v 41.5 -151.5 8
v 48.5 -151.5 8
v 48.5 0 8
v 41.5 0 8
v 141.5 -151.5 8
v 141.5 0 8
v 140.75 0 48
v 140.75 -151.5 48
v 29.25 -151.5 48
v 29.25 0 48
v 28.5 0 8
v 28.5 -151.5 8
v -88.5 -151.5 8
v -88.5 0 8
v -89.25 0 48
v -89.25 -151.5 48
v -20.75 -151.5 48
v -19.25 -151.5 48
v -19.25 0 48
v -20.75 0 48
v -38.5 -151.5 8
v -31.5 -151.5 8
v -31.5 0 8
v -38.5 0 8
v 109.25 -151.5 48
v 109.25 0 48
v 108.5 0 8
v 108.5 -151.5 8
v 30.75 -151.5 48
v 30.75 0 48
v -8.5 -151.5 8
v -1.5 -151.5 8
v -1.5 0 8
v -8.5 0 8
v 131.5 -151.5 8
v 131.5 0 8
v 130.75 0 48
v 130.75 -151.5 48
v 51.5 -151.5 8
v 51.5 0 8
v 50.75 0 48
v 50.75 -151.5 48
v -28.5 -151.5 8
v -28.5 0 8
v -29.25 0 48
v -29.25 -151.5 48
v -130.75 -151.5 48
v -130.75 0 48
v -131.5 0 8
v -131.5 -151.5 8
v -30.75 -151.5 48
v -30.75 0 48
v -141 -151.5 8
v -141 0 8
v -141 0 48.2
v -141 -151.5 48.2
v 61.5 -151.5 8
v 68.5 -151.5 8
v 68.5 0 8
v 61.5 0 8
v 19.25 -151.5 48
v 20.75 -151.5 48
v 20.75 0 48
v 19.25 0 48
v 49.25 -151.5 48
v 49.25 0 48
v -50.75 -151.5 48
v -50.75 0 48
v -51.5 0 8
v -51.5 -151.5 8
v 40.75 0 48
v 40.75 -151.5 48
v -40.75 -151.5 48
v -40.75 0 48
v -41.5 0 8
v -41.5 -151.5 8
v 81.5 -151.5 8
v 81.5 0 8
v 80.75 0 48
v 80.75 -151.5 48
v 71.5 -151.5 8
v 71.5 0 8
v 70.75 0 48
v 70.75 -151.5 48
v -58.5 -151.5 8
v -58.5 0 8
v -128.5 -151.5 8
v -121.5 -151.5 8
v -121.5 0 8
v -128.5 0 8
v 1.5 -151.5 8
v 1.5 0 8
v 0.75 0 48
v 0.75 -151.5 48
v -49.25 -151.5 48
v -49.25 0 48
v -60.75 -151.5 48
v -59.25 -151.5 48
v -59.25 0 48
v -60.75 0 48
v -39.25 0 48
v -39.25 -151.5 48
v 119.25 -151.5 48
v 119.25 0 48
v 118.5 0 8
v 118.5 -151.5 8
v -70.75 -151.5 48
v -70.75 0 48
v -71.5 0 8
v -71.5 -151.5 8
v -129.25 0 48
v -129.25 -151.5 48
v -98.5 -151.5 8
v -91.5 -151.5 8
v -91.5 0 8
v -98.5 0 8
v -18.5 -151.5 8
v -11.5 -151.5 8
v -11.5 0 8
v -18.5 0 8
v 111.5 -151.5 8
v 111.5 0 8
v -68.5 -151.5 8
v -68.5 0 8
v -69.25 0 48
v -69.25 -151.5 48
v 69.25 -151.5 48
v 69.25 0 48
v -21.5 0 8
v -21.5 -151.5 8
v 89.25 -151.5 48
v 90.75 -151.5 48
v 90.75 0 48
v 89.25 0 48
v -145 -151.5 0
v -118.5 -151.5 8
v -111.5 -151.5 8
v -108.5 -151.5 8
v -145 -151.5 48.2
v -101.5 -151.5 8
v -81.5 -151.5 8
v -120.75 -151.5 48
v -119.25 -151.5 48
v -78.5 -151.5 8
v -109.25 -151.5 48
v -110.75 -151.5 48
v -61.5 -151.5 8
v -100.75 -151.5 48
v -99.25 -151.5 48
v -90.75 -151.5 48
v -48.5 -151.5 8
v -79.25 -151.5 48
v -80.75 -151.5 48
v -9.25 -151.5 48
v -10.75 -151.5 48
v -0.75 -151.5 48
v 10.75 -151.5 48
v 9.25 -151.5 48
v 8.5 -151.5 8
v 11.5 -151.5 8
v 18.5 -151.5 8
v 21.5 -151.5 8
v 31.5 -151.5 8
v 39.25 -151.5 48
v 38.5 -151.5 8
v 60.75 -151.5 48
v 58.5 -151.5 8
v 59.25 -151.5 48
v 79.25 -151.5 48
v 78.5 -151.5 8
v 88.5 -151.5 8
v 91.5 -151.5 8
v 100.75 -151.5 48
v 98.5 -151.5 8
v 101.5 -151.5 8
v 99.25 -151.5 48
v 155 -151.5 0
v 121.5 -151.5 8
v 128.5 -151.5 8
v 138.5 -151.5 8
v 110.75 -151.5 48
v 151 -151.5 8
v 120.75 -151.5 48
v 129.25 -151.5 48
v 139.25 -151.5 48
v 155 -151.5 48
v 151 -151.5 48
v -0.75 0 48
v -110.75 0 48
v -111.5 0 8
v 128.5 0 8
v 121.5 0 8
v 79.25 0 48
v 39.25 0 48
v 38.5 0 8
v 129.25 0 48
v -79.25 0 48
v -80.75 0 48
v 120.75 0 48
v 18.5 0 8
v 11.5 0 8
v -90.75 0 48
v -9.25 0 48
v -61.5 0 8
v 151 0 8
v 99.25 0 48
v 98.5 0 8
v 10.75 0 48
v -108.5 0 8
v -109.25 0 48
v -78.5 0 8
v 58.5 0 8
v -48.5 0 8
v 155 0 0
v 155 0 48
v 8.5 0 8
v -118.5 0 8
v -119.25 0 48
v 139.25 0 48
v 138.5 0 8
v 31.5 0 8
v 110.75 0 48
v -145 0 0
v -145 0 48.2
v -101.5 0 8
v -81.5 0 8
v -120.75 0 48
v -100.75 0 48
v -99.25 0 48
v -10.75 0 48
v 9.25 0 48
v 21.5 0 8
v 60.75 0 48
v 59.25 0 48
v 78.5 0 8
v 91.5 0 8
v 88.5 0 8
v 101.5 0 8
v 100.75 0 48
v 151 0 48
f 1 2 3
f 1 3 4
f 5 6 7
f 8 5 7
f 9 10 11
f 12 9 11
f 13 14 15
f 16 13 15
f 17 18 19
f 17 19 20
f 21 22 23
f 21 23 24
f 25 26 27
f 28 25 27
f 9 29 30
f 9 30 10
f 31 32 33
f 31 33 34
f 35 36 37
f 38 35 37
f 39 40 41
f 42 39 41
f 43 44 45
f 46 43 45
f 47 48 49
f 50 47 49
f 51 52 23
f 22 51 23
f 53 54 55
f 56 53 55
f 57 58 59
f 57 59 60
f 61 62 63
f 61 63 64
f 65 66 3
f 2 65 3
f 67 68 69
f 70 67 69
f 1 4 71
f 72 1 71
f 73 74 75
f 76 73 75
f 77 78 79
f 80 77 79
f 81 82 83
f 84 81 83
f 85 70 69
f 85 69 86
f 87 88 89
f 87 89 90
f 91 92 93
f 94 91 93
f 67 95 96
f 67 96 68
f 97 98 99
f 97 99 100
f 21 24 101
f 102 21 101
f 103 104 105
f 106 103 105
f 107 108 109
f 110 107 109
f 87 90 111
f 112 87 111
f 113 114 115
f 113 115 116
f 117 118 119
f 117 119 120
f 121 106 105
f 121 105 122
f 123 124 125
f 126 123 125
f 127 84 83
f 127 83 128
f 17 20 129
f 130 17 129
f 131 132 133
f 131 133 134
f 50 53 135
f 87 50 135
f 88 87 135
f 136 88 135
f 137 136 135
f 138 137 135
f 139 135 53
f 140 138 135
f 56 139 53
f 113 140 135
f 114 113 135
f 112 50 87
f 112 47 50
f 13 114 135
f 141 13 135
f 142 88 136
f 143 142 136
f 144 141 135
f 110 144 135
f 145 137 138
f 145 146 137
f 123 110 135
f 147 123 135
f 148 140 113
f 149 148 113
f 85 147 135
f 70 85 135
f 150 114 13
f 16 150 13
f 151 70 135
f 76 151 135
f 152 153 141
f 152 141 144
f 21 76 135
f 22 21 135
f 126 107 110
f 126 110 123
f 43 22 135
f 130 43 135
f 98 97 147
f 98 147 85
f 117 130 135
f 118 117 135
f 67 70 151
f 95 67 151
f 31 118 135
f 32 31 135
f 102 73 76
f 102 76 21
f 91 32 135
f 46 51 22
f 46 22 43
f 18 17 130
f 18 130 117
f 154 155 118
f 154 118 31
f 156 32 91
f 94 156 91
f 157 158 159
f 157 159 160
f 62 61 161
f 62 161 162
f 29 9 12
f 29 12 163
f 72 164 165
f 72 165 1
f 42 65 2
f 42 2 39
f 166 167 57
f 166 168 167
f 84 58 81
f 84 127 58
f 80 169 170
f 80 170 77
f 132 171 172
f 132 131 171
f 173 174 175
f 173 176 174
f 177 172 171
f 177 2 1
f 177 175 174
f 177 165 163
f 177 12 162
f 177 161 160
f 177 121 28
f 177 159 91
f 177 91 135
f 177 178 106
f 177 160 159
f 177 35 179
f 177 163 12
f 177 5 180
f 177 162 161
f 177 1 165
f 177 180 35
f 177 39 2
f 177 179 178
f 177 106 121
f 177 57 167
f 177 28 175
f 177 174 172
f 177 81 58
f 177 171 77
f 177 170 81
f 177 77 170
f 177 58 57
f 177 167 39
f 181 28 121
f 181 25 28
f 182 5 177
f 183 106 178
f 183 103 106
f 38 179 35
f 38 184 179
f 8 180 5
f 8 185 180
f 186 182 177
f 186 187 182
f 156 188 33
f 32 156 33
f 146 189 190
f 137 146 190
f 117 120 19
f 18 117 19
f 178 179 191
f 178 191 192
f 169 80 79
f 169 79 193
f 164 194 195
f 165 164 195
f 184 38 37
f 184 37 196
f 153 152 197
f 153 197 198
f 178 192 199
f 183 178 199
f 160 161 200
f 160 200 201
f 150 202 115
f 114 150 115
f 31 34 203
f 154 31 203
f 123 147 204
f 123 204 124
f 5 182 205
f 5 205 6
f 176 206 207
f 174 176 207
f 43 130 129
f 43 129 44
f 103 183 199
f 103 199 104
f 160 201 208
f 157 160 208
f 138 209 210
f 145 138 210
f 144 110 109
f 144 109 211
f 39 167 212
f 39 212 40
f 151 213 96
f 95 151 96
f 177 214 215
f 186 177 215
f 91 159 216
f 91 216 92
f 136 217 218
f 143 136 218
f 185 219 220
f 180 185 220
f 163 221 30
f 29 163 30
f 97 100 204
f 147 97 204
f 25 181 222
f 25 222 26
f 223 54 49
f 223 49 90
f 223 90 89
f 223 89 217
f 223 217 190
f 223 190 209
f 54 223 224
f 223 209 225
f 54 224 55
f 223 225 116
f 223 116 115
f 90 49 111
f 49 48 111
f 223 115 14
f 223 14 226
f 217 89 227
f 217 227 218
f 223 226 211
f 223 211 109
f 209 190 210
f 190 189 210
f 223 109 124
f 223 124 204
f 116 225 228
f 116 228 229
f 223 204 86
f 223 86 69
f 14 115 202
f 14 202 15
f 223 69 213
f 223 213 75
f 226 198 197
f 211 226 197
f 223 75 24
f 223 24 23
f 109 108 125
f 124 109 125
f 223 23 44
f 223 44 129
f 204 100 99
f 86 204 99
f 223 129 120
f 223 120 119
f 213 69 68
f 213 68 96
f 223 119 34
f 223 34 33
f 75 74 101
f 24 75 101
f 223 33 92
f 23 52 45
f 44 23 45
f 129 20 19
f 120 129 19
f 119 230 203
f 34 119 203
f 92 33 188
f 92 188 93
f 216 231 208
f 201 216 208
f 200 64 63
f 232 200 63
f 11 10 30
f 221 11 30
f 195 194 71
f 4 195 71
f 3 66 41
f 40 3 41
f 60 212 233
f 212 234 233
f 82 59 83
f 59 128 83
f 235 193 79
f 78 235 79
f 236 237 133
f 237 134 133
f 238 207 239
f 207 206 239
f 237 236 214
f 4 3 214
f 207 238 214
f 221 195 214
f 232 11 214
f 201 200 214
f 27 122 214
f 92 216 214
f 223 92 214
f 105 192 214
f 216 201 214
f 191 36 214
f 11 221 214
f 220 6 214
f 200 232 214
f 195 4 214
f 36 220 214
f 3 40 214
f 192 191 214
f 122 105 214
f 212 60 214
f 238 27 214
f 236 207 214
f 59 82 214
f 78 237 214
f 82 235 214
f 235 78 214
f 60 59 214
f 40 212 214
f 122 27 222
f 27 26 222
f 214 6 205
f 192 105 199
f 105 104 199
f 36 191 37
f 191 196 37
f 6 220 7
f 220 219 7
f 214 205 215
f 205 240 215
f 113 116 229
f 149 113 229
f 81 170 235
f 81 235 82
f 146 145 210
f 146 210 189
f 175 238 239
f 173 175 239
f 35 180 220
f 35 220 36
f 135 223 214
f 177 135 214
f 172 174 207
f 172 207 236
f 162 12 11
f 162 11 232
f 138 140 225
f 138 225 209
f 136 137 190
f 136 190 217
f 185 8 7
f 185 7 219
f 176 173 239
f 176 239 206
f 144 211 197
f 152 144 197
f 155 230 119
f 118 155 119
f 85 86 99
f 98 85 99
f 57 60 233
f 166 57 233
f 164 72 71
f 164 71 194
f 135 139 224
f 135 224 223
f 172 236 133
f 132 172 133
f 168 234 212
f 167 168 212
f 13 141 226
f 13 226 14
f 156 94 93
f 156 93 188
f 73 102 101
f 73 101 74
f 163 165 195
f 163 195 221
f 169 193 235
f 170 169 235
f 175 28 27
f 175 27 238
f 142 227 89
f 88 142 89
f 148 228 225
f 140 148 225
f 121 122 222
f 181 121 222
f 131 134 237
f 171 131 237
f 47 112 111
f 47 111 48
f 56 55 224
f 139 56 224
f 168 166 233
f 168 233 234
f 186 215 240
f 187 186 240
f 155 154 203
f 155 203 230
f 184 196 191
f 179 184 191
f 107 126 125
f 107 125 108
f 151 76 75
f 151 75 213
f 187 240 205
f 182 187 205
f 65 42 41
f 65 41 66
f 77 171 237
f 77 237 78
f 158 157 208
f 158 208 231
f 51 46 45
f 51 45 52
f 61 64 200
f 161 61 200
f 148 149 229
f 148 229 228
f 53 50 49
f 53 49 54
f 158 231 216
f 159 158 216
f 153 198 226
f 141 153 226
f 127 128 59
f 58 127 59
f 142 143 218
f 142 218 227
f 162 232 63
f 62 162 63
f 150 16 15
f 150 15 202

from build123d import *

# Parameters (mm, degrees)
F1_DEPTH = 151.5


with BuildPart() as f1:
    # F0 (on Front) → F1 (new body)
    with BuildSketch(Plane.XZ):
        Polygon((0.75, 48), (0, 48), (-0.75, 48), (-1.5, 8), (-8.5, 8), (-9.25, 48), (-10, 48), (-10.75, 48), (-11.5, 8), (-18.5, 8), (-19.25, 48), (-20, 48), (-20.75, 48), (-21.5, 8), (-28.5, 8), (-29.25, 48), (-30, 48), (-30.75, 48), (-31.5, 8), (-38.5, 8), (-39.25, 48), (-40, 48), (-40.75, 48), (-41.5, 8), (-48.5, 8), (-49.25, 48), (-50, 48), (-50.75, 48), (-51.5, 8), (-58.5, 8), (-59.25, 48), (-60, 48), (-60.75, 48), (-61.5, 8), (-68.5, 8), (-69.25, 48), (-70, 48), (-70.75, 48), (-71.5, 8), (-78.5, 8), (-79.25, 48), (-80, 48), (-80.75, 48), (-81.5, 8), (-88.5, 8), (-89.25, 48), (-90, 48), (-90.75, 48), (-91.5, 8), (-98.5, 8), (-99.25, 48), (-100, 48), (-100.75, 48), (-101.5, 8), (-108.5, 8), (-109.25, 48), (-110, 48), (-110.75, 48), (-111.5, 8), (-118.5, 8), (-119.25, 48), (-120, 48), (-120.75, 48), (-121.5, 8), (-128.5, 8), (-129.25, 48), (-130, 48), (-130.75, 48), (-131.5, 8), (-141, 8), (-141, 48.199648), (-145, 48.199648), (-145, 0), (155, 0), (155, 48), (151, 48), (151, 8), (141.5, 8), (140.75, 48), (140, 48), (139.25, 48), (138.5, 8), (131.5, 8), (130.75, 48), (130, 48), (129.25, 48), (128.5, 8), (121.5, 8), (120.75, 48), (120, 48), (119.25, 48), (118.5, 8), (111.5, 8), (110.75, 48), (110, 48), (109.25, 48), (108.5, 8), (101.5, 8), (100.75, 48), (100, 48), (99.25, 48), (98.5, 8), (91.5, 8), (90.75, 48), (90, 48), (89.25, 48), (88.5, 8), (81.5, 8), (80.75, 48), (80, 48), (79.25, 48), (78.5, 8), (71.5, 8), (70.75, 48), (70, 48), (69.25, 48), (68.5, 8), (61.5, 8), (60.75, 48), (60, 48), (59.25, 48), (58.5, 8), (51.5, 8), (50.75, 48), (50, 48), (49.25, 48), (48.5, 8), (41.5, 8), (40.75, 48), (40, 48), (39.25, 48), (38.5, 8), (31.5, 8), (30.75, 48), (30, 48), (29.25, 48), (28.5, 8), (21.5, 8), (20.75, 48), (20, 48), (19.25, 48), (18.5, 8), (11.5, 8), (10.75, 48), (10, 48), (9.25, 48), (8.5, 8), (1.5, 8), align=None)
    extrude(amount=F1_DEPTH)


solid = f1.part
